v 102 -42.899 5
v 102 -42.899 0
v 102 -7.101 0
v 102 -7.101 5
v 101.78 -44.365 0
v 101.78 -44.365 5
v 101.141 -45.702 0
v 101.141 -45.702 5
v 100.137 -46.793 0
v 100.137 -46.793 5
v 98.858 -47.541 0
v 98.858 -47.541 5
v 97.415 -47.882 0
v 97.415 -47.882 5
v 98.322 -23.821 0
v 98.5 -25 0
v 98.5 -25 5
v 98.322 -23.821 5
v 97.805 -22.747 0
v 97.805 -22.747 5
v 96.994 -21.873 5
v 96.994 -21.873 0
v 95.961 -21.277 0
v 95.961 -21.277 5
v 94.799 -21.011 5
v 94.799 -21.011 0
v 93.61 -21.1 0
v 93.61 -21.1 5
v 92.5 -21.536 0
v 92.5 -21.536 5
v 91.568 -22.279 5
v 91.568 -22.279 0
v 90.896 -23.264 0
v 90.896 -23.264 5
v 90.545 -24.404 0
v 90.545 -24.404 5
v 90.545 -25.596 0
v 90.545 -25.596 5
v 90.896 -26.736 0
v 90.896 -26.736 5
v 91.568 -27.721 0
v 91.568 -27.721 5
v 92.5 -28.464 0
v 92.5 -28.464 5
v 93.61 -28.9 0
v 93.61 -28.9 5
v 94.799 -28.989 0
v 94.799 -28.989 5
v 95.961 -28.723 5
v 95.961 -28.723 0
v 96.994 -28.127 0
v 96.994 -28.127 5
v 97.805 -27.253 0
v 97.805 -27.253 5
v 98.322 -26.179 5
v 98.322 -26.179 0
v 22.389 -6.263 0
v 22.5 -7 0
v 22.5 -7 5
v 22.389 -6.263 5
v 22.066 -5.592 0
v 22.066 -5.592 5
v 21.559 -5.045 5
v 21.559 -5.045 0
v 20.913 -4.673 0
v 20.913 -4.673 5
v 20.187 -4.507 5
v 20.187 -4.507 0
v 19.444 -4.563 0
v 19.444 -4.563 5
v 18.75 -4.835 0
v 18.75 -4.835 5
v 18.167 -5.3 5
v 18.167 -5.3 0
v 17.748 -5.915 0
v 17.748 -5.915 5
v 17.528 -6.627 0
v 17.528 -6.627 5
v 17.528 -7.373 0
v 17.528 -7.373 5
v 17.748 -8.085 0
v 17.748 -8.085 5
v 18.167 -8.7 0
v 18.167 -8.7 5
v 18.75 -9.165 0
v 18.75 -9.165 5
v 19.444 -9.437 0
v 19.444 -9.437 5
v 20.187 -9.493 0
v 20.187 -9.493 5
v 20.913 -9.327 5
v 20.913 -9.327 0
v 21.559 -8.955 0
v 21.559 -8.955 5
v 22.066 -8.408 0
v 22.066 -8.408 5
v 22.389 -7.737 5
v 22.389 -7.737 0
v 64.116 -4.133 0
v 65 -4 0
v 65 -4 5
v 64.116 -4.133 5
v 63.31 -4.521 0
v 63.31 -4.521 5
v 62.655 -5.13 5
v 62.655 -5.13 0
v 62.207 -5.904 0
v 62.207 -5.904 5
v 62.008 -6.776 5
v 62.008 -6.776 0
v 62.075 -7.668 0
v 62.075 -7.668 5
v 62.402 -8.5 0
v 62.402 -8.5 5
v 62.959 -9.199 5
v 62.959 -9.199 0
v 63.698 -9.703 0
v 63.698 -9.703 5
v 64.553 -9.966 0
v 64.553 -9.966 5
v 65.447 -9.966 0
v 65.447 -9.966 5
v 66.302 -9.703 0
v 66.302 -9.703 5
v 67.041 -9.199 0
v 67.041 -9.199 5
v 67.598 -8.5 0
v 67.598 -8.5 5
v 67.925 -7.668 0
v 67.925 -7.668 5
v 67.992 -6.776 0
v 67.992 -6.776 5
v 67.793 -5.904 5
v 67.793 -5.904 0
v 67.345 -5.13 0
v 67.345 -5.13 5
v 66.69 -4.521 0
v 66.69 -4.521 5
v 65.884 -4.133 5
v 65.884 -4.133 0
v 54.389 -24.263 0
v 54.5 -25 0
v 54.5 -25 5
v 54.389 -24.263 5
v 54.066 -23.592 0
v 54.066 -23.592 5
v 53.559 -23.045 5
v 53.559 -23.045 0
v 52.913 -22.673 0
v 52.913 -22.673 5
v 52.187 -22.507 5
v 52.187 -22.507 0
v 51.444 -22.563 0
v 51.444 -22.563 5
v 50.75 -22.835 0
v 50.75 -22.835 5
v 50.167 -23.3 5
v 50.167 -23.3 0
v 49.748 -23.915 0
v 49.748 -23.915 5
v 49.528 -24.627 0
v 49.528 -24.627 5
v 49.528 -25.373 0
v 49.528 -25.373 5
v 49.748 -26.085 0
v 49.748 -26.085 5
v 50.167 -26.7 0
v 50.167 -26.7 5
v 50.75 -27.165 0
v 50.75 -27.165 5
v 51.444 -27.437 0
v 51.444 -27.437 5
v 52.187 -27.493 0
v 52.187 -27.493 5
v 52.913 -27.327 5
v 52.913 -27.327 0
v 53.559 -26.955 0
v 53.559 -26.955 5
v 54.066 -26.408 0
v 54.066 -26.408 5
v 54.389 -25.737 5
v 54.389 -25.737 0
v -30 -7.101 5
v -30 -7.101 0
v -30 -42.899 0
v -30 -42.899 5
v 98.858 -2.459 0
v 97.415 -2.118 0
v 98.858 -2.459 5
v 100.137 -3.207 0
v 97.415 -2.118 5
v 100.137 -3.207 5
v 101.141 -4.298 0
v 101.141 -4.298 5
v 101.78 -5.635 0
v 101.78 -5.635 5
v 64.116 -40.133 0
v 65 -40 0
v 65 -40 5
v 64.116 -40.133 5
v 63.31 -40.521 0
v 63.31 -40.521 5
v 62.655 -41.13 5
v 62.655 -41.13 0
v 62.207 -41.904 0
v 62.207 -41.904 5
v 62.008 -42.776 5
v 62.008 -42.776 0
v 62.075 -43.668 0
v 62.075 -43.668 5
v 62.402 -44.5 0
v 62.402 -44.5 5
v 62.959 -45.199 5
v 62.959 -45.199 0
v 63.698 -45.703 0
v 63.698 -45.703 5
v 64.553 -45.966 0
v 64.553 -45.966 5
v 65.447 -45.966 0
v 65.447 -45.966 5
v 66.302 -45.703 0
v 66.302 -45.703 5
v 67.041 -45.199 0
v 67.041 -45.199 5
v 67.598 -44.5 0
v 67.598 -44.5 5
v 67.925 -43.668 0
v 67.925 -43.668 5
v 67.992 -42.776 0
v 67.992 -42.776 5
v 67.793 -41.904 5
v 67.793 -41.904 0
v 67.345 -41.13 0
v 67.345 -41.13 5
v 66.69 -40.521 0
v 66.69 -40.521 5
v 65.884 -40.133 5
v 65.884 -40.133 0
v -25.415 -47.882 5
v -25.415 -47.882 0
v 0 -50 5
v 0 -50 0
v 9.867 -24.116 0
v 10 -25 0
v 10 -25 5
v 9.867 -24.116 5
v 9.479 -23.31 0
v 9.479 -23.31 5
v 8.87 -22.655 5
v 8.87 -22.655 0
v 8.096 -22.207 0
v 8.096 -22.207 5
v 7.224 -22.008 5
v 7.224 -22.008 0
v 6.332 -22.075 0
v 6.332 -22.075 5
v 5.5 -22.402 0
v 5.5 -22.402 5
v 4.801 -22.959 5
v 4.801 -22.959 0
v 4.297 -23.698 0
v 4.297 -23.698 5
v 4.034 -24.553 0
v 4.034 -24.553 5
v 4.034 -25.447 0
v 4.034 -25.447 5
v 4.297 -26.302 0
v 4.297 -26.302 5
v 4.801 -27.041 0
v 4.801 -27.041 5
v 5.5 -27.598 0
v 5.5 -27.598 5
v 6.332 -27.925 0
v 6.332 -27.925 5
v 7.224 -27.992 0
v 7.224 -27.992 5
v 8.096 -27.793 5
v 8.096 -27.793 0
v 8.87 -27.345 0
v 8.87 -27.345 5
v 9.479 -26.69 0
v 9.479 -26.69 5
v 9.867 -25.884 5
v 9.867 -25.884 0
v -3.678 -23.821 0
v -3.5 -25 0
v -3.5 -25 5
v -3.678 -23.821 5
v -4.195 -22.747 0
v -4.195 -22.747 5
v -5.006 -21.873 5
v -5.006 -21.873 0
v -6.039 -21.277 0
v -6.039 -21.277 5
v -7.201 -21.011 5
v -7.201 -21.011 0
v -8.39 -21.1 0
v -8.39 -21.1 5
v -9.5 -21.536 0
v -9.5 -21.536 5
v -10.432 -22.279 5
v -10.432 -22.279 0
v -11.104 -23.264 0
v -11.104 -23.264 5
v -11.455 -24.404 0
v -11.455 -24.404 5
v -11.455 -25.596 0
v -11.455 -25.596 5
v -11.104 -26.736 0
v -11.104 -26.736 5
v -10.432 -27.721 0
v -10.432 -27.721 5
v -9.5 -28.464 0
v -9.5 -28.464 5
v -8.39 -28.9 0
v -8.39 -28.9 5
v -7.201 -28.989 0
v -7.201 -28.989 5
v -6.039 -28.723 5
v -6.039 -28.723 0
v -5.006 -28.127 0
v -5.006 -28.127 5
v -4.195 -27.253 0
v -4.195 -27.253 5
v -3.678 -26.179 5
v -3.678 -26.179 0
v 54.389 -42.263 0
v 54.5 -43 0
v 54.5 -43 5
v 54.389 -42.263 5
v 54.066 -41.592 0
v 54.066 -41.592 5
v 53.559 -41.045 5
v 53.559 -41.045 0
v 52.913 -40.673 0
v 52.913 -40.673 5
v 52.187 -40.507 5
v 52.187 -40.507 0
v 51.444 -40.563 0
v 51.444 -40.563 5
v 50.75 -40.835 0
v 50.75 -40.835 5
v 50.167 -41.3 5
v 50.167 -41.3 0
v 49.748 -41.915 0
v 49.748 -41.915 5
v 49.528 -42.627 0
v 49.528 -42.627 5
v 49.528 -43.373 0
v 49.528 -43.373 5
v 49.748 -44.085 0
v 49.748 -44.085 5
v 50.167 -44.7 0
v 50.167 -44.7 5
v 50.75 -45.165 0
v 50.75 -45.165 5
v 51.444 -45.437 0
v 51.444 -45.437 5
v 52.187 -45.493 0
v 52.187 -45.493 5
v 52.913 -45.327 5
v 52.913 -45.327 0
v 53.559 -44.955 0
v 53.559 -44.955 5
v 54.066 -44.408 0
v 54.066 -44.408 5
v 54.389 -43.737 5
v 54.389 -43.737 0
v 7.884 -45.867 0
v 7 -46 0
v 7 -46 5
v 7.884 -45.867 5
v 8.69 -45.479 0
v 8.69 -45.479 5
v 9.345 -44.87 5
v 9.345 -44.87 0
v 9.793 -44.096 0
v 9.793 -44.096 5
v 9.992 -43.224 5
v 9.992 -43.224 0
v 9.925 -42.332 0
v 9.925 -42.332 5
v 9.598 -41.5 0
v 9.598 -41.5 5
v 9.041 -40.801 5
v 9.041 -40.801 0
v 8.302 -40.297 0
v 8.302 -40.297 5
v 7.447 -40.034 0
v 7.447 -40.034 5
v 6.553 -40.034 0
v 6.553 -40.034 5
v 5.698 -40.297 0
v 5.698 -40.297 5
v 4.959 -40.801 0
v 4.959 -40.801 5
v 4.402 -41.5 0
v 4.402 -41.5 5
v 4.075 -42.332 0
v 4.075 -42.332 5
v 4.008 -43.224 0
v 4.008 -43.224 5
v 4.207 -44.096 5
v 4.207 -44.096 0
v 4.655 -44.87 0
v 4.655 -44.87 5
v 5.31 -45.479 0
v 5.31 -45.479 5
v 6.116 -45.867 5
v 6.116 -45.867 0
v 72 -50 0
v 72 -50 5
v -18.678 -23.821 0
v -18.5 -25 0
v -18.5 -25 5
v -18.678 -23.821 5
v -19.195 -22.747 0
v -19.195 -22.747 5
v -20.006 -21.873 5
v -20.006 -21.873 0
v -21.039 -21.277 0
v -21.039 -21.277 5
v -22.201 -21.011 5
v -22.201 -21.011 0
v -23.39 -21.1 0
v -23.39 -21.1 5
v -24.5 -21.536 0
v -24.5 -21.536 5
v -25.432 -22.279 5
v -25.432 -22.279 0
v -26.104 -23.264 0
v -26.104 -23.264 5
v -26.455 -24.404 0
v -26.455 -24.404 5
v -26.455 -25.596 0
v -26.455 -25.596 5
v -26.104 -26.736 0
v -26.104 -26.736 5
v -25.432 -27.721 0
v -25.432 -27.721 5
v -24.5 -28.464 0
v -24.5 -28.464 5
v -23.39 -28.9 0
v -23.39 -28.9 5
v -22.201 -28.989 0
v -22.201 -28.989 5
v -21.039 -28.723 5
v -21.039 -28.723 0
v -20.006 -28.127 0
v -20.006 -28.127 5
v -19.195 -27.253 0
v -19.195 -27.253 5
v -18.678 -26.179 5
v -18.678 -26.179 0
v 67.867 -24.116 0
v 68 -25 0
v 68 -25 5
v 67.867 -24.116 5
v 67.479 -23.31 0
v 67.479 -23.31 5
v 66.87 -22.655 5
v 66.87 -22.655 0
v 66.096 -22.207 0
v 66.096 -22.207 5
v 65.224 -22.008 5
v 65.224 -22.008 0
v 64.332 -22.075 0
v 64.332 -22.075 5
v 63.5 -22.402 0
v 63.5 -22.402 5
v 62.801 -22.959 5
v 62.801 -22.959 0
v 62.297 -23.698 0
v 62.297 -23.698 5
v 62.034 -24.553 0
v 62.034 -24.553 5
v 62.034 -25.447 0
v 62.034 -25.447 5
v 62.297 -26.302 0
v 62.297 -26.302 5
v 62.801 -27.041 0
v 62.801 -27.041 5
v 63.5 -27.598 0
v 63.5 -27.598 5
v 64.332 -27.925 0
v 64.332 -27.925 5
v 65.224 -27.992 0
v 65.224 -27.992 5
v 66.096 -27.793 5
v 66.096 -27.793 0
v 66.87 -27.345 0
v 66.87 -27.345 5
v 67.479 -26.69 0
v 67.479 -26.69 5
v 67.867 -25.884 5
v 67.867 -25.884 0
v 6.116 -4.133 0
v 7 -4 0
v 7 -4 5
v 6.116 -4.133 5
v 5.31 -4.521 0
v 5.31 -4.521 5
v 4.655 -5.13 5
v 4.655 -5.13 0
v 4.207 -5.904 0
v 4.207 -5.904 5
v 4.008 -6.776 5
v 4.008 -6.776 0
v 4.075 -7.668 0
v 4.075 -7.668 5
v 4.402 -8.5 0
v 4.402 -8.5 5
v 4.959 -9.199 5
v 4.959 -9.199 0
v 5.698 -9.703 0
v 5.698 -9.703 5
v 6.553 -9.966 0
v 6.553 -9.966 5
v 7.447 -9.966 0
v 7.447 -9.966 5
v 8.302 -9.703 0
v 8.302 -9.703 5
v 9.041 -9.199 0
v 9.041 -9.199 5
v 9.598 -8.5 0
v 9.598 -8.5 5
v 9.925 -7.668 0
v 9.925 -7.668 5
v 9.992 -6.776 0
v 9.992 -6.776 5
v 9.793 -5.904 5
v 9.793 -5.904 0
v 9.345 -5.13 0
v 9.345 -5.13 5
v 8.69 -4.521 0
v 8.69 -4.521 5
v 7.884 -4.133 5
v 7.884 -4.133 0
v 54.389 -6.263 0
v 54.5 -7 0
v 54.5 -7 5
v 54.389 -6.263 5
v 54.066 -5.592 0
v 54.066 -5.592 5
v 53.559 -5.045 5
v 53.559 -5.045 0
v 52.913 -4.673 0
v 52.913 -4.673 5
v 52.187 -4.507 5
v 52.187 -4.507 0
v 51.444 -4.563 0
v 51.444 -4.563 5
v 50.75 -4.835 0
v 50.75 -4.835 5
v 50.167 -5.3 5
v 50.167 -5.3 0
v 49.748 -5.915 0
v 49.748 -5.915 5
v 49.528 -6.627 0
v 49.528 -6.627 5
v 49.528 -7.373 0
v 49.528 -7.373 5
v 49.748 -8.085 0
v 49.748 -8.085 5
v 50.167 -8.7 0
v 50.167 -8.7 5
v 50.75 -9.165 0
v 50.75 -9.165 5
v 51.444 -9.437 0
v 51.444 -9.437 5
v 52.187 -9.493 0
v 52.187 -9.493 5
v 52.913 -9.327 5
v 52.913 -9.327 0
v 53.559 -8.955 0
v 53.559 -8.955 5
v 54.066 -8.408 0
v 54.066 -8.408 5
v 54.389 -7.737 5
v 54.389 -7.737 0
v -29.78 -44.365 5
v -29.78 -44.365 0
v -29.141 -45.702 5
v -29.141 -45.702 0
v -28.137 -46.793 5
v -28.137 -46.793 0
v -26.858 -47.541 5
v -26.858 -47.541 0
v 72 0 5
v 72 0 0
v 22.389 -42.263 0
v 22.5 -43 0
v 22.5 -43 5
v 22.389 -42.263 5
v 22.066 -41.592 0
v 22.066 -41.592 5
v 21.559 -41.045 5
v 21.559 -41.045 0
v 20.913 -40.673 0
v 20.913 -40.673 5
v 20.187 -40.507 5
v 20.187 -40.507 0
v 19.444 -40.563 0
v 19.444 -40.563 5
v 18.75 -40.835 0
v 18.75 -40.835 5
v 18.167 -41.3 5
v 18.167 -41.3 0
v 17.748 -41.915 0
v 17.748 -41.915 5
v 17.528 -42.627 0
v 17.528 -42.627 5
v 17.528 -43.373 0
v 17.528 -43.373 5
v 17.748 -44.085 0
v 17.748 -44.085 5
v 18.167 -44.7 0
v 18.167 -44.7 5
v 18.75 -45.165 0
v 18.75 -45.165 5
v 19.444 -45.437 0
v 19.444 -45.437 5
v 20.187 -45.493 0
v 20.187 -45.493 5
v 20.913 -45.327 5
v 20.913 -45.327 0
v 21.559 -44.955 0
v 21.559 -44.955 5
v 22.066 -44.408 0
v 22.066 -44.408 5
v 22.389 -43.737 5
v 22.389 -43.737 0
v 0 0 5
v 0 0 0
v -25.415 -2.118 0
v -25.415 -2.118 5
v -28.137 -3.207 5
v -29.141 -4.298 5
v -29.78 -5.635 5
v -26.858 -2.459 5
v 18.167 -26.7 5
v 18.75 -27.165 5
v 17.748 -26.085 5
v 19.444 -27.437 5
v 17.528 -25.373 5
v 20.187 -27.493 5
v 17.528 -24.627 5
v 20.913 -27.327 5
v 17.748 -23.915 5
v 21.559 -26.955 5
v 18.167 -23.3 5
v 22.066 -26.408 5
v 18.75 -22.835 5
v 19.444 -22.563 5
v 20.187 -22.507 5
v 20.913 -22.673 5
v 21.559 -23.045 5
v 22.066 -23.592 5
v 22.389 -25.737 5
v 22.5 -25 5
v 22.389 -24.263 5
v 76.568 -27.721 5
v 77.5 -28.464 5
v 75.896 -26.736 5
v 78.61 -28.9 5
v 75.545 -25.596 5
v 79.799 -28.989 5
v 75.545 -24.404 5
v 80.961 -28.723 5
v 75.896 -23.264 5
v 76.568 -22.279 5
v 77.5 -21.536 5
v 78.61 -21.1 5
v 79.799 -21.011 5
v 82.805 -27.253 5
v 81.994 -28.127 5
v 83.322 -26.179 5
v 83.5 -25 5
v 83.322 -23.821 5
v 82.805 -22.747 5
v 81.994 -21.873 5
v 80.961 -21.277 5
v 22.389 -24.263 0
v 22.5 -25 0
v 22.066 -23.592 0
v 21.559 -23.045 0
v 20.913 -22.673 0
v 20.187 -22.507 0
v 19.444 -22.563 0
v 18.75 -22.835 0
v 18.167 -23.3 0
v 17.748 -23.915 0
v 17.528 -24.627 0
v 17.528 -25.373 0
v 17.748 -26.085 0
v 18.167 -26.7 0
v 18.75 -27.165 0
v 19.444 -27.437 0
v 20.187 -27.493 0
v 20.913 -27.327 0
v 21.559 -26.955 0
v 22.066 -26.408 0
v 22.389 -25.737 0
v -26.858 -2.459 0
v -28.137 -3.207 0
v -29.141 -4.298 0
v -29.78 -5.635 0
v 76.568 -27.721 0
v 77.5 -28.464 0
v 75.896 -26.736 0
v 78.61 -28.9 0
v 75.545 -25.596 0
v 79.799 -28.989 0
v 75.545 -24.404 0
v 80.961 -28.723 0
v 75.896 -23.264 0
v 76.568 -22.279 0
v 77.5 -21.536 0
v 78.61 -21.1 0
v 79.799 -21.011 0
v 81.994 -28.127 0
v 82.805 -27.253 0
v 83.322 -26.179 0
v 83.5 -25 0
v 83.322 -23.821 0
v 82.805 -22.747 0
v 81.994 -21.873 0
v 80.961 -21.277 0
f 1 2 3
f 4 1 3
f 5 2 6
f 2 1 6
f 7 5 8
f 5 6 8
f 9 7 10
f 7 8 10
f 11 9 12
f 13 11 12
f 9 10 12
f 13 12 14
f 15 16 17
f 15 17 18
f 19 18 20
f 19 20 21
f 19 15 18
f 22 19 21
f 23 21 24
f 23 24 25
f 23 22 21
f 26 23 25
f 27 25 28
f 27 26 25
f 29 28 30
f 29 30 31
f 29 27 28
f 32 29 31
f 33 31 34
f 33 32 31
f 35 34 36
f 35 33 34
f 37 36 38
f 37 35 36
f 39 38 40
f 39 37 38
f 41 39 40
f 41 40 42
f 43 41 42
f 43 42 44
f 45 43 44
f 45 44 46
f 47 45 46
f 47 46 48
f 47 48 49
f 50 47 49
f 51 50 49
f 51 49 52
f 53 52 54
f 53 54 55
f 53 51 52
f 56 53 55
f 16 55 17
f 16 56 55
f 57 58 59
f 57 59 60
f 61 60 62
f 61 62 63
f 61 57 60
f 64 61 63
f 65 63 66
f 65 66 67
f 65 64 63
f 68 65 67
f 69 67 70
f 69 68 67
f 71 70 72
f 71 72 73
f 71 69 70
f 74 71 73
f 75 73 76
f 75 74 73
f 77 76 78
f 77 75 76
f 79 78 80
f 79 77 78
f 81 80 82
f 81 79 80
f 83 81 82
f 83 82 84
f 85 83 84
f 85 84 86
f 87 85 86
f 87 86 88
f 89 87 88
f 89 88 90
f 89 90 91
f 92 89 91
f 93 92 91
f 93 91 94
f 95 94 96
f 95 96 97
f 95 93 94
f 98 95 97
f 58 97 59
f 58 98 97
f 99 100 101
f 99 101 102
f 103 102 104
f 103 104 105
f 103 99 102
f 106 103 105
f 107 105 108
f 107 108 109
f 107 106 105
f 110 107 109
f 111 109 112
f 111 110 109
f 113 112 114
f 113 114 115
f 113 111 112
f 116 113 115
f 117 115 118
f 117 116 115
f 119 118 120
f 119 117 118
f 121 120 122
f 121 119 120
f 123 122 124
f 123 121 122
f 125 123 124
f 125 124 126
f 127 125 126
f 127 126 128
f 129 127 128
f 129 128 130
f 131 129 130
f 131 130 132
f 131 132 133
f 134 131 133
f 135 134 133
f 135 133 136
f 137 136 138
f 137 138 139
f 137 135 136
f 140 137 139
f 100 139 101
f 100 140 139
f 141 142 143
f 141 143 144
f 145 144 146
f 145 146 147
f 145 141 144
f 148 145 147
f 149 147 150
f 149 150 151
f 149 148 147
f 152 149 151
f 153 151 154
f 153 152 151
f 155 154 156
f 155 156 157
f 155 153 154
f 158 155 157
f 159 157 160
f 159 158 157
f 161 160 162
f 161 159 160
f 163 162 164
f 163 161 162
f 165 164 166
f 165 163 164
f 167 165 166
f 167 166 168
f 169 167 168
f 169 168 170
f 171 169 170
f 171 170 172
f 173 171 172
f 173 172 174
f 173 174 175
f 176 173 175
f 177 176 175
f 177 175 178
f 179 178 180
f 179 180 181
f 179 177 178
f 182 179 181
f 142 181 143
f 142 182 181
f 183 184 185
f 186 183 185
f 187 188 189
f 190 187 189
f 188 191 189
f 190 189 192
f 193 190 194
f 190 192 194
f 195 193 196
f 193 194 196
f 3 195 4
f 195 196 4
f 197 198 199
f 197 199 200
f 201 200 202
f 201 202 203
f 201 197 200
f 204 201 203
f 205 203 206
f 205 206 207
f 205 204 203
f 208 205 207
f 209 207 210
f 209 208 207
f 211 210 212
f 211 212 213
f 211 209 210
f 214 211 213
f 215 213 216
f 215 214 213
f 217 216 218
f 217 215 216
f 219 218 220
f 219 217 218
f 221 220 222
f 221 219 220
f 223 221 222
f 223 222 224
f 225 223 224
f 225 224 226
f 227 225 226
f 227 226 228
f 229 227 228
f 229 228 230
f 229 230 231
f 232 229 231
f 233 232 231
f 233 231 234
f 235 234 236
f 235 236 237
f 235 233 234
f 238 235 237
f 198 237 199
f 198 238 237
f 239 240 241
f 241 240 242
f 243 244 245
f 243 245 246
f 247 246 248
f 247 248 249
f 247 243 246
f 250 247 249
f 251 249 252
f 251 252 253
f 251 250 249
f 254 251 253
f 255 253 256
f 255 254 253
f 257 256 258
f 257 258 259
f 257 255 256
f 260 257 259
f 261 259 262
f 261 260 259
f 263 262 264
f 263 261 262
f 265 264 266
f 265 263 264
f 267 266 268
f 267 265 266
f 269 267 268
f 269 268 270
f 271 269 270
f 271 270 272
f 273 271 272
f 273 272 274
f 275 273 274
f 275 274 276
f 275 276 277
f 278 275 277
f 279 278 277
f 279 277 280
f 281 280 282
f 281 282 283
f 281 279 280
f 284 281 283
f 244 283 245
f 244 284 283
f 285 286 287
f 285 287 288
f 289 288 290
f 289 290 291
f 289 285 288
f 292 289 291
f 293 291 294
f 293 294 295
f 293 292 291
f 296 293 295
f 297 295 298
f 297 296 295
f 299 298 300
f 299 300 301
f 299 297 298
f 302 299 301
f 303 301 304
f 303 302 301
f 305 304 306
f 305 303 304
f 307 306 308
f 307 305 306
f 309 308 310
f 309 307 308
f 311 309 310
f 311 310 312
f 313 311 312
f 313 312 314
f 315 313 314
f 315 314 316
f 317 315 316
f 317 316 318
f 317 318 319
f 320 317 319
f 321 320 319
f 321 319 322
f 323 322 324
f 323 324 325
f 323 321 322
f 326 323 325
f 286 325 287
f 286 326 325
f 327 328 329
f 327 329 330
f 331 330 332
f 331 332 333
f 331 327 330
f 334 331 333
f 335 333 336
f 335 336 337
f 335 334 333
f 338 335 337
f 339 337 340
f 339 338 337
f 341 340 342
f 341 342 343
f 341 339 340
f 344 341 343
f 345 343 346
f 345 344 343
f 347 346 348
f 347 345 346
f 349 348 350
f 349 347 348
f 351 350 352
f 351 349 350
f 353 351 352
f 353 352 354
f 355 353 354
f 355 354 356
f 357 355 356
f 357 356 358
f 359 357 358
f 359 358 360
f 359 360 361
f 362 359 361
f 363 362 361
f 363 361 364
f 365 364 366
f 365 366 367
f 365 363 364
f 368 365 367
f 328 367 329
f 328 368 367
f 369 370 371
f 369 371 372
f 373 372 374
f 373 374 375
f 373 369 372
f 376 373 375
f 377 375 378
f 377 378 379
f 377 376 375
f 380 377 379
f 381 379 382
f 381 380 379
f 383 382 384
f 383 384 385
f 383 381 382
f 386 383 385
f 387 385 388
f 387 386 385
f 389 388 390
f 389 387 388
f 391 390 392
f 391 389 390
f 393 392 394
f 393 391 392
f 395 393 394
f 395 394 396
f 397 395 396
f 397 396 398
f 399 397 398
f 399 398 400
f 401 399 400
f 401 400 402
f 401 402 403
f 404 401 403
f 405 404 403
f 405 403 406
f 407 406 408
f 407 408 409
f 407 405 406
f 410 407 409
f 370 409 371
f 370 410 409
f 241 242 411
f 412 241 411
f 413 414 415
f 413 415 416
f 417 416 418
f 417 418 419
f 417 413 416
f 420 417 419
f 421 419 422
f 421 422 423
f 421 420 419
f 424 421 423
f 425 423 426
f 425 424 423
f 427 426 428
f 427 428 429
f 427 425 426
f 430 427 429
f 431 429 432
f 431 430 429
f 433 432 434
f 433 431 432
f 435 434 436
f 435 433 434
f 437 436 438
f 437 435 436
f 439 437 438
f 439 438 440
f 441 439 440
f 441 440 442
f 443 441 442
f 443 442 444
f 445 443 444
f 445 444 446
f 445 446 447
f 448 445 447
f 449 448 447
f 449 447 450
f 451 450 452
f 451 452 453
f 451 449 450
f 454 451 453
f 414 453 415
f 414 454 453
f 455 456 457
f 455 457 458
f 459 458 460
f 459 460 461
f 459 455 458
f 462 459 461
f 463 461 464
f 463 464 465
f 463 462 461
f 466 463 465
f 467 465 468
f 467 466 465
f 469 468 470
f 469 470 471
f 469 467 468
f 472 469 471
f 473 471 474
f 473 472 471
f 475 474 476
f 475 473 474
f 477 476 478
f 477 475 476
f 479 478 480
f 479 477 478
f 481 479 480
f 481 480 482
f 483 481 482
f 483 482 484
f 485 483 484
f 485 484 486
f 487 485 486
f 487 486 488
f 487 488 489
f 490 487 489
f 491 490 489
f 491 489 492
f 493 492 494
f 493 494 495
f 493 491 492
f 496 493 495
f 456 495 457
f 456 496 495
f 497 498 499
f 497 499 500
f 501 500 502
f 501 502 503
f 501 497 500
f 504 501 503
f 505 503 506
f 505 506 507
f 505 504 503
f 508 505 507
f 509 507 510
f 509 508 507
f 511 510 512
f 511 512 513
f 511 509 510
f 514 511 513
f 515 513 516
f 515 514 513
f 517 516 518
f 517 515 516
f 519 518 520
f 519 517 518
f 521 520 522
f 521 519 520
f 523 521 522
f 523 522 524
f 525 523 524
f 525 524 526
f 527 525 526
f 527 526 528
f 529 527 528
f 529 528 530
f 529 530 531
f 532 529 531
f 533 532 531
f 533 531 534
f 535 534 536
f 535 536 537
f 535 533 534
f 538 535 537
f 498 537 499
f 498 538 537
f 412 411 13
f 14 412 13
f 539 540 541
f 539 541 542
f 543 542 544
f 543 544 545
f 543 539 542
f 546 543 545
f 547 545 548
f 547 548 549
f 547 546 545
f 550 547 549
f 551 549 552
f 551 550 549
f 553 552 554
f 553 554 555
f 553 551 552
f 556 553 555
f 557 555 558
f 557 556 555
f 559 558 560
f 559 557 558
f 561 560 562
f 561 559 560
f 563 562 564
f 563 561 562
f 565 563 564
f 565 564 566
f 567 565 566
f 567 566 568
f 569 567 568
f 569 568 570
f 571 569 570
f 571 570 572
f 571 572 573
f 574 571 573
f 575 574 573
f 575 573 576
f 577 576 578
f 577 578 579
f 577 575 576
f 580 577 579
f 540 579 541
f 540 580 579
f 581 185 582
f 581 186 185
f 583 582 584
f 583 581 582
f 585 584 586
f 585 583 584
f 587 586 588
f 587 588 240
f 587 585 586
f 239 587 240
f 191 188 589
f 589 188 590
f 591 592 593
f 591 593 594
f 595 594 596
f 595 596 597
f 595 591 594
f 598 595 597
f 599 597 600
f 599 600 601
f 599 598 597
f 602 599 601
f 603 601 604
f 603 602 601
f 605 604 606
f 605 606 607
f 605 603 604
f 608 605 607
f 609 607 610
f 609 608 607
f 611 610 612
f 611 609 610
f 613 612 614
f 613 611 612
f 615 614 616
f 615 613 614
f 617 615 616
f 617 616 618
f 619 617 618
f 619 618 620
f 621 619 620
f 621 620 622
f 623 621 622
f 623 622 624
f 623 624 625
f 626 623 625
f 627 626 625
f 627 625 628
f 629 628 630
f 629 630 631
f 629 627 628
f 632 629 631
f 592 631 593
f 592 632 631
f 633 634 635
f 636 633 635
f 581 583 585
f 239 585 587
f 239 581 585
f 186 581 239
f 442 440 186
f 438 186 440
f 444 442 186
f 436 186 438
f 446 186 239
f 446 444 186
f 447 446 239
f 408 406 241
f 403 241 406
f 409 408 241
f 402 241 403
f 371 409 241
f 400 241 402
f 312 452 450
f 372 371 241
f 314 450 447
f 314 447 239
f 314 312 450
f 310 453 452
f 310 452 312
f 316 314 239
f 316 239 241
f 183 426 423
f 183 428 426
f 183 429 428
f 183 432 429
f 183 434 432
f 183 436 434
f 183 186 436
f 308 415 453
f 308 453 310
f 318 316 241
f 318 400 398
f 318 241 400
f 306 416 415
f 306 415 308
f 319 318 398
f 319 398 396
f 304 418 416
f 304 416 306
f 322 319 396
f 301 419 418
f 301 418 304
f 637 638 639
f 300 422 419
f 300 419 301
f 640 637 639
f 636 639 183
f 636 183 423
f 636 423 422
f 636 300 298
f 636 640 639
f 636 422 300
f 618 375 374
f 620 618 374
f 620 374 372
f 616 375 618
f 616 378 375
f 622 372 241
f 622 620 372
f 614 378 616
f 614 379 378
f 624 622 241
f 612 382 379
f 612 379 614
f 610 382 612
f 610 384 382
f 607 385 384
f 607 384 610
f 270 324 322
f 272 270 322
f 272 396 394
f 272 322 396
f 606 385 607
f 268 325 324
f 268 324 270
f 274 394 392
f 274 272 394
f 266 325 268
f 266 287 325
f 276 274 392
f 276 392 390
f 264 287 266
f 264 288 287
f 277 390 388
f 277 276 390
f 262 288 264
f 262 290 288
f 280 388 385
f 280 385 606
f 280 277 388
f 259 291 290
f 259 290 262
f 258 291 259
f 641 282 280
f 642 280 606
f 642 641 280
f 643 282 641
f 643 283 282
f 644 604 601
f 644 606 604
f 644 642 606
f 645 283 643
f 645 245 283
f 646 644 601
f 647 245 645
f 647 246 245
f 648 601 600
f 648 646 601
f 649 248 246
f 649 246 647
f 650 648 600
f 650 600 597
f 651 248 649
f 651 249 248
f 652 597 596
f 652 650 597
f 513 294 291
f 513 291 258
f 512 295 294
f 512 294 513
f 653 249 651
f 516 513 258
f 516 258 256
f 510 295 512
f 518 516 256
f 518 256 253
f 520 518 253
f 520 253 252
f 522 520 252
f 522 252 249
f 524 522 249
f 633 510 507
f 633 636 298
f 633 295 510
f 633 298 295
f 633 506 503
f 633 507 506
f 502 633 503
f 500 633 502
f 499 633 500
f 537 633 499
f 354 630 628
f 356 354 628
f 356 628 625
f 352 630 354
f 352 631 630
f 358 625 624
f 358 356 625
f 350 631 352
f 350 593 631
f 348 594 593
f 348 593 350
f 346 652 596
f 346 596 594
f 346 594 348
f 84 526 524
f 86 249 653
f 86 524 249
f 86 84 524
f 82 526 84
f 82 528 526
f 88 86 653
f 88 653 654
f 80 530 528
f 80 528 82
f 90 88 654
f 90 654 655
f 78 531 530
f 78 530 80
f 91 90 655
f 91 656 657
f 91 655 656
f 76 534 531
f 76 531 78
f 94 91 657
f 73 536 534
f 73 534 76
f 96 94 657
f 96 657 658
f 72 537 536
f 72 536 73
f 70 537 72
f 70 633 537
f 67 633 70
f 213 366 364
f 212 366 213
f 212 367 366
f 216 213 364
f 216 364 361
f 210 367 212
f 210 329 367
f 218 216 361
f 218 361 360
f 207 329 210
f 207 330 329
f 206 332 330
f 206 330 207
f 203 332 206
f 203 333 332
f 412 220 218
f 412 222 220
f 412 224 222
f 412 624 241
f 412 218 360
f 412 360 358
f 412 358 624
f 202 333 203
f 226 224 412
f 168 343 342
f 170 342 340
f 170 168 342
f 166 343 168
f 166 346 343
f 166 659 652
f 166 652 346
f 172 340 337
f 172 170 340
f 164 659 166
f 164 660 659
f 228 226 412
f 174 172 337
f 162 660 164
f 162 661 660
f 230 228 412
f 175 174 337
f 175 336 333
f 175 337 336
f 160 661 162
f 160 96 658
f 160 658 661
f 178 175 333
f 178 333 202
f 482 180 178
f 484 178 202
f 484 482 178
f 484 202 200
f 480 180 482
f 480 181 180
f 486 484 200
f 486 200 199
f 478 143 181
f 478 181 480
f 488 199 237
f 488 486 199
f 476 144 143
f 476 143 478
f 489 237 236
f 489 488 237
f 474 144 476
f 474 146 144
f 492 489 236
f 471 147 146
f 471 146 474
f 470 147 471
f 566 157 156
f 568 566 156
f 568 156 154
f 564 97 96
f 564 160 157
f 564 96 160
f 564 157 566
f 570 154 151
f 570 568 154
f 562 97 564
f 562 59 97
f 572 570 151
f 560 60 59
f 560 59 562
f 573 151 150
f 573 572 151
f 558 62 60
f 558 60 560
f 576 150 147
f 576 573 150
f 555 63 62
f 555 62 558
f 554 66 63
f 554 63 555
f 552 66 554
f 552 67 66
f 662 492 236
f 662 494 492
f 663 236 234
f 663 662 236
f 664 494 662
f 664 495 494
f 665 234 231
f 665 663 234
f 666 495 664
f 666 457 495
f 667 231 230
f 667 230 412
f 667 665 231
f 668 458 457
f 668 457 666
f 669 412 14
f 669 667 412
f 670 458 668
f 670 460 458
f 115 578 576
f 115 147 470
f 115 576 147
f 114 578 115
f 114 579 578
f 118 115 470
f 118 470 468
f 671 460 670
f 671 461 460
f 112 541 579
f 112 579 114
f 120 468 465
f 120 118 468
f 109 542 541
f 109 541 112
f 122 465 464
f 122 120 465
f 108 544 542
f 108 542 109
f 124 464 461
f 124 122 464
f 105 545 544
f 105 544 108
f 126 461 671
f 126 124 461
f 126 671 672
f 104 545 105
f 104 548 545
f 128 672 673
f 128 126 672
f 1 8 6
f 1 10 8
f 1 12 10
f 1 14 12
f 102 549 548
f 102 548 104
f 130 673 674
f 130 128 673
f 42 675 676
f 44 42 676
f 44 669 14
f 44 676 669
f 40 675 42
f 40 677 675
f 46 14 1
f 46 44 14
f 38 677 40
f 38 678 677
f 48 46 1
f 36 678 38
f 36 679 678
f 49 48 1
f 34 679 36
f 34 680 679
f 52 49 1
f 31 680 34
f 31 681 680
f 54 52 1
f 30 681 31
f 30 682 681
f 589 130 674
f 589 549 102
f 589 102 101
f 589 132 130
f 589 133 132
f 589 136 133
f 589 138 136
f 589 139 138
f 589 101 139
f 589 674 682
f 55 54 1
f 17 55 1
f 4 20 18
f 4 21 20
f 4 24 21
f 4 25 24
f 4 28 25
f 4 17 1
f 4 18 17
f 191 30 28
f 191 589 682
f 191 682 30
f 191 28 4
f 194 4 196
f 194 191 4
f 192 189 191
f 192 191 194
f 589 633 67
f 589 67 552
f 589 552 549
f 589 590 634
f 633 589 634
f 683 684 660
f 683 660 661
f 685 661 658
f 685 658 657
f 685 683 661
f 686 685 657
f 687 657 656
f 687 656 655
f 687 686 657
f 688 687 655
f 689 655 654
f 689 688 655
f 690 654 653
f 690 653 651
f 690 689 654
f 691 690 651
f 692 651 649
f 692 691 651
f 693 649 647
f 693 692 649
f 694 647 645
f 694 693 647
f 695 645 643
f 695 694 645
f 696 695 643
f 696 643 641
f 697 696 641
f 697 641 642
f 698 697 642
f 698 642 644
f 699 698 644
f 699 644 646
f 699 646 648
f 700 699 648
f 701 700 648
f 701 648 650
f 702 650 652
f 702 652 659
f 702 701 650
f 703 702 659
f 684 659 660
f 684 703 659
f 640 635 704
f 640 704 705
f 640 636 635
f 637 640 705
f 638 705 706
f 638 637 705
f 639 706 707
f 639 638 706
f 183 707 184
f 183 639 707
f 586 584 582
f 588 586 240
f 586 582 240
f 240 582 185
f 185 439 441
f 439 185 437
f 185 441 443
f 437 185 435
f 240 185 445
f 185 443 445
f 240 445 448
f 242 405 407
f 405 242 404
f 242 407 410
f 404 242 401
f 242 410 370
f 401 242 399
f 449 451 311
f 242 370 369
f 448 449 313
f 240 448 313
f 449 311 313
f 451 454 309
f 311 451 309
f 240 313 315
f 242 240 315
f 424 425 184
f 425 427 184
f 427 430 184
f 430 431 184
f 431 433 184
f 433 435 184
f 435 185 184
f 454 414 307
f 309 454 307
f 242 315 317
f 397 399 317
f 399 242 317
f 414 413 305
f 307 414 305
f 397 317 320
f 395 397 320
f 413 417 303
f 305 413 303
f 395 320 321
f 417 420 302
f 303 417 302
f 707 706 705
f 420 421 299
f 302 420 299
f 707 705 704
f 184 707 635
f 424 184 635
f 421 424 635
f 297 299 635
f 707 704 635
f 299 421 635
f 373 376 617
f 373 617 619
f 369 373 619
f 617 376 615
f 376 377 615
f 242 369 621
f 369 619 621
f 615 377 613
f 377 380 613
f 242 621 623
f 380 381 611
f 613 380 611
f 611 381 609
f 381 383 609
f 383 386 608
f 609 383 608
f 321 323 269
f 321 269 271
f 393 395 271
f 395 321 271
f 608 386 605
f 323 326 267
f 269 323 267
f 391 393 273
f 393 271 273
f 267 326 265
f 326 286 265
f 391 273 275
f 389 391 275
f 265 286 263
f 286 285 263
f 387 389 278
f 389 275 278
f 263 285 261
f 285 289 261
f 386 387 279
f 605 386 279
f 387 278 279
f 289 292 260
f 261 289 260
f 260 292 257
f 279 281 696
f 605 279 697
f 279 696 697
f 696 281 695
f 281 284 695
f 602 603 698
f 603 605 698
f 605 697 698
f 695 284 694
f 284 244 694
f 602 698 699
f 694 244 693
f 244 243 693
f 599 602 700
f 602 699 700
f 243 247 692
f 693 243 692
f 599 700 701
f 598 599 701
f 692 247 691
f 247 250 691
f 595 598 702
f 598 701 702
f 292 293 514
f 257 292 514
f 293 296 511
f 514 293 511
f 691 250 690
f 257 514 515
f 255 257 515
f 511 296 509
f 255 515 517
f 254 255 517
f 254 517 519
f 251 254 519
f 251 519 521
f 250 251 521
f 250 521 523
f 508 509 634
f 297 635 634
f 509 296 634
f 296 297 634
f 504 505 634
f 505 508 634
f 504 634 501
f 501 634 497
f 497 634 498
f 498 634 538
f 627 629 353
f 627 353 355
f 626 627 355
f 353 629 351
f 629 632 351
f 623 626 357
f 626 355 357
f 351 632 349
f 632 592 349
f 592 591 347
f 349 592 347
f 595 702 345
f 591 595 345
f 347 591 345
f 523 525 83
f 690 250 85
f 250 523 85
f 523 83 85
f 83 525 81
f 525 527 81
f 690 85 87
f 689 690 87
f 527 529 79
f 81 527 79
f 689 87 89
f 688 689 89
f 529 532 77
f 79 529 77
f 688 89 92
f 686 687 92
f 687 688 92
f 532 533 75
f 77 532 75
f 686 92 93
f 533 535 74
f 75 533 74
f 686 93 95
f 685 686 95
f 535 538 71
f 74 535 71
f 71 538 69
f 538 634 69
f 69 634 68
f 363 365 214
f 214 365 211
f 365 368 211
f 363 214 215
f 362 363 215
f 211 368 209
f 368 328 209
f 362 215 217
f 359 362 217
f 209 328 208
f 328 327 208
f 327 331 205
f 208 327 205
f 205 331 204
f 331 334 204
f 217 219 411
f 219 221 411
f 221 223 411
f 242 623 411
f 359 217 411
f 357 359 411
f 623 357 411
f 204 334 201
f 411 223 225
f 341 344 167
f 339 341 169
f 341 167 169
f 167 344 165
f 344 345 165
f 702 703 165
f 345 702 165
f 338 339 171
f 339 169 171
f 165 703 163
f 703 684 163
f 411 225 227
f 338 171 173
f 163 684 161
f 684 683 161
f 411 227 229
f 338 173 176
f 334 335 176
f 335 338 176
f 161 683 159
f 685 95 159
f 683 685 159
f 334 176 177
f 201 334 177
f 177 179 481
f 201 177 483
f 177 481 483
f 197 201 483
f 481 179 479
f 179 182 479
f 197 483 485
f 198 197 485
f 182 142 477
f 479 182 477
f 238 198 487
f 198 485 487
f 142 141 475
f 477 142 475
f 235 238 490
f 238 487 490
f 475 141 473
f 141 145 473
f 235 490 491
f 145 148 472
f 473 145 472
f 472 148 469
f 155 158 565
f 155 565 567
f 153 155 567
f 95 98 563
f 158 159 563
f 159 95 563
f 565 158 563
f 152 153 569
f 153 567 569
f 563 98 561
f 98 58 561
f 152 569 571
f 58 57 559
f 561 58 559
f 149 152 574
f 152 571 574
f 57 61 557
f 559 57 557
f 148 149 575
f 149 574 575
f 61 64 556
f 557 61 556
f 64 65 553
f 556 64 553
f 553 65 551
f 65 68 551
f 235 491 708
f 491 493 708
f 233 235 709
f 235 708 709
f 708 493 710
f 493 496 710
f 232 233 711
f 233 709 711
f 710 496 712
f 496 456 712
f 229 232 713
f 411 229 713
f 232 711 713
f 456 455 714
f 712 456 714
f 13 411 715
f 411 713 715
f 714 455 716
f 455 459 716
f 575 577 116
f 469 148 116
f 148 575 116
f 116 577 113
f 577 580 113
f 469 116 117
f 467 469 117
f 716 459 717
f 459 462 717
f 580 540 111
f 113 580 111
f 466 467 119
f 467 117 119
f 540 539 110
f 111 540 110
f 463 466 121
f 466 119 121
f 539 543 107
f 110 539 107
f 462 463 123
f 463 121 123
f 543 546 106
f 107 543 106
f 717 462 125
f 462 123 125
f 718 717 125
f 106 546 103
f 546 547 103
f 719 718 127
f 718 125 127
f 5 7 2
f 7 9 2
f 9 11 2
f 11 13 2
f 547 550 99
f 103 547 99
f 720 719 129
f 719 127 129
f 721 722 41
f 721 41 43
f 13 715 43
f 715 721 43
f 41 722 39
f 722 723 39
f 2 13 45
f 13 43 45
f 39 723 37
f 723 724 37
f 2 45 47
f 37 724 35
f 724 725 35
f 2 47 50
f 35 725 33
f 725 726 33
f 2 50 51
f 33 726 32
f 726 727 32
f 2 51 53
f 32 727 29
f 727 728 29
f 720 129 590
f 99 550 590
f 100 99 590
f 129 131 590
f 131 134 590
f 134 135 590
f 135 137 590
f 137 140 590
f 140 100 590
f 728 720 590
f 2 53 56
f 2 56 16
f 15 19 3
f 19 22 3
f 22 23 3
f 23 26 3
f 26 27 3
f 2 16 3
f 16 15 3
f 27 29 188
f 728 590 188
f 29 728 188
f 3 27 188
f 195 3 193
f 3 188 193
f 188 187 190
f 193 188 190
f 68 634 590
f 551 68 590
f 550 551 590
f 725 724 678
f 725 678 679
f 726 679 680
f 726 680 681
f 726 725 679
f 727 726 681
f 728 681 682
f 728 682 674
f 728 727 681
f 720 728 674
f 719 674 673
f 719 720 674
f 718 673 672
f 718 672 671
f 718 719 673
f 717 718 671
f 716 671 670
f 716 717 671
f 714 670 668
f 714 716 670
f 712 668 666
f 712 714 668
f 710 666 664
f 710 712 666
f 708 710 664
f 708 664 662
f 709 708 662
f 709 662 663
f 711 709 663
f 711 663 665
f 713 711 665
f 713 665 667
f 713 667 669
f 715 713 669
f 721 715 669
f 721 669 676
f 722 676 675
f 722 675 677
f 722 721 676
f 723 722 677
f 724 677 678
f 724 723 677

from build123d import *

# Parameters (mm, degrees)
SKETCH1_R           = 4
SKETCH1_R_2         = 2.5
SKETCH1_R_3         = 3
BOSS_EXTRUDE1_DEPTH = 5
FILLET1_R           = 5


with BuildPart() as part:
    # Sketch1 → Boss-Extrude1 (new body)
    with BuildSketch(Plane.XY):
        Polygon((72, 0), (0, 0), (-30, -2.5), (-30, -47.5), (0, -50), (72, -50), (102, -47.5), (102, -2.5), align=None)
        with Locations((-22.5, -25)):
            Circle(SKETCH1_R, mode=Mode.SUBTRACT)
        with Locations((-7.5, -25)):
            Circle(SKETCH1_R, mode=Mode.SUBTRACT)
        with Locations((52, -43)):
            Circle(SKETCH1_R_2, mode=Mode.SUBTRACT)
        with Locations((52, -7)):
            Circle(SKETCH1_R_2, mode=Mode.SUBTRACT)
        with Locations((79.5, -25)):
            Circle(SKETCH1_R, mode=Mode.SUBTRACT)
        with Locations((94.5, -25)):
            Circle(SKETCH1_R, mode=Mode.SUBTRACT)
        with Locations((20, -25)):
            Circle(SKETCH1_R_2, mode=Mode.SUBTRACT)
        with Locations((52, -25)):
            Circle(SKETCH1_R_2, mode=Mode.SUBTRACT)
        with Locations((7, -25)):
            Circle(SKETCH1_R_3, mode=Mode.SUBTRACT)
        with Locations((65, -25)):
            Circle(SKETCH1_R_3, mode=Mode.SUBTRACT)
        with Locations((20, -7)):
            Circle(SKETCH1_R_2, mode=Mode.SUBTRACT)
        with Locations((20, -43)):
            Circle(SKETCH1_R_2, mode=Mode.SUBTRACT)
        with BuildLine():
            ThreePointArc((7, -40), (4, -43), (7, -46))
            ThreePointArc((7, -46), (10, -43), (7, -40))
        make_face(mode=Mode.SUBTRACT)
        with BuildLine():
            ThreePointArc((65, -46), (68, -43), (65, -40))
            ThreePointArc((65, -40), (62, -43), (65, -46))
        make_face(mode=Mode.SUBTRACT)
        with BuildLine():
            ThreePointArc((65, -10), (68, -7), (65, -4))
            ThreePointArc((65, -4), (62, -7), (65, -10))
        make_face(mode=Mode.SUBTRACT)
        with BuildLine():
            ThreePointArc((7, -10), (10, -7), (7, -4))
            ThreePointArc((7, -4), (4, -7), (7, -10))
        make_face(mode=Mode.SUBTRACT)
    extrude(amount=BOSS_EXTRUDE1_DEPTH)

    # Fillet1
    fillet1_edges = [part.edges().sort_by_distance(p)[0] for p in [
        (102, -2.5, 2.5),
        (102, -47.5, 2.5),
        (-30, -47.5, 2.5),
        (-30, -2.5, 2.5),
    ]]
    fillet(fillet1_edges, radius=FILLET1_R)


solid = part.part
